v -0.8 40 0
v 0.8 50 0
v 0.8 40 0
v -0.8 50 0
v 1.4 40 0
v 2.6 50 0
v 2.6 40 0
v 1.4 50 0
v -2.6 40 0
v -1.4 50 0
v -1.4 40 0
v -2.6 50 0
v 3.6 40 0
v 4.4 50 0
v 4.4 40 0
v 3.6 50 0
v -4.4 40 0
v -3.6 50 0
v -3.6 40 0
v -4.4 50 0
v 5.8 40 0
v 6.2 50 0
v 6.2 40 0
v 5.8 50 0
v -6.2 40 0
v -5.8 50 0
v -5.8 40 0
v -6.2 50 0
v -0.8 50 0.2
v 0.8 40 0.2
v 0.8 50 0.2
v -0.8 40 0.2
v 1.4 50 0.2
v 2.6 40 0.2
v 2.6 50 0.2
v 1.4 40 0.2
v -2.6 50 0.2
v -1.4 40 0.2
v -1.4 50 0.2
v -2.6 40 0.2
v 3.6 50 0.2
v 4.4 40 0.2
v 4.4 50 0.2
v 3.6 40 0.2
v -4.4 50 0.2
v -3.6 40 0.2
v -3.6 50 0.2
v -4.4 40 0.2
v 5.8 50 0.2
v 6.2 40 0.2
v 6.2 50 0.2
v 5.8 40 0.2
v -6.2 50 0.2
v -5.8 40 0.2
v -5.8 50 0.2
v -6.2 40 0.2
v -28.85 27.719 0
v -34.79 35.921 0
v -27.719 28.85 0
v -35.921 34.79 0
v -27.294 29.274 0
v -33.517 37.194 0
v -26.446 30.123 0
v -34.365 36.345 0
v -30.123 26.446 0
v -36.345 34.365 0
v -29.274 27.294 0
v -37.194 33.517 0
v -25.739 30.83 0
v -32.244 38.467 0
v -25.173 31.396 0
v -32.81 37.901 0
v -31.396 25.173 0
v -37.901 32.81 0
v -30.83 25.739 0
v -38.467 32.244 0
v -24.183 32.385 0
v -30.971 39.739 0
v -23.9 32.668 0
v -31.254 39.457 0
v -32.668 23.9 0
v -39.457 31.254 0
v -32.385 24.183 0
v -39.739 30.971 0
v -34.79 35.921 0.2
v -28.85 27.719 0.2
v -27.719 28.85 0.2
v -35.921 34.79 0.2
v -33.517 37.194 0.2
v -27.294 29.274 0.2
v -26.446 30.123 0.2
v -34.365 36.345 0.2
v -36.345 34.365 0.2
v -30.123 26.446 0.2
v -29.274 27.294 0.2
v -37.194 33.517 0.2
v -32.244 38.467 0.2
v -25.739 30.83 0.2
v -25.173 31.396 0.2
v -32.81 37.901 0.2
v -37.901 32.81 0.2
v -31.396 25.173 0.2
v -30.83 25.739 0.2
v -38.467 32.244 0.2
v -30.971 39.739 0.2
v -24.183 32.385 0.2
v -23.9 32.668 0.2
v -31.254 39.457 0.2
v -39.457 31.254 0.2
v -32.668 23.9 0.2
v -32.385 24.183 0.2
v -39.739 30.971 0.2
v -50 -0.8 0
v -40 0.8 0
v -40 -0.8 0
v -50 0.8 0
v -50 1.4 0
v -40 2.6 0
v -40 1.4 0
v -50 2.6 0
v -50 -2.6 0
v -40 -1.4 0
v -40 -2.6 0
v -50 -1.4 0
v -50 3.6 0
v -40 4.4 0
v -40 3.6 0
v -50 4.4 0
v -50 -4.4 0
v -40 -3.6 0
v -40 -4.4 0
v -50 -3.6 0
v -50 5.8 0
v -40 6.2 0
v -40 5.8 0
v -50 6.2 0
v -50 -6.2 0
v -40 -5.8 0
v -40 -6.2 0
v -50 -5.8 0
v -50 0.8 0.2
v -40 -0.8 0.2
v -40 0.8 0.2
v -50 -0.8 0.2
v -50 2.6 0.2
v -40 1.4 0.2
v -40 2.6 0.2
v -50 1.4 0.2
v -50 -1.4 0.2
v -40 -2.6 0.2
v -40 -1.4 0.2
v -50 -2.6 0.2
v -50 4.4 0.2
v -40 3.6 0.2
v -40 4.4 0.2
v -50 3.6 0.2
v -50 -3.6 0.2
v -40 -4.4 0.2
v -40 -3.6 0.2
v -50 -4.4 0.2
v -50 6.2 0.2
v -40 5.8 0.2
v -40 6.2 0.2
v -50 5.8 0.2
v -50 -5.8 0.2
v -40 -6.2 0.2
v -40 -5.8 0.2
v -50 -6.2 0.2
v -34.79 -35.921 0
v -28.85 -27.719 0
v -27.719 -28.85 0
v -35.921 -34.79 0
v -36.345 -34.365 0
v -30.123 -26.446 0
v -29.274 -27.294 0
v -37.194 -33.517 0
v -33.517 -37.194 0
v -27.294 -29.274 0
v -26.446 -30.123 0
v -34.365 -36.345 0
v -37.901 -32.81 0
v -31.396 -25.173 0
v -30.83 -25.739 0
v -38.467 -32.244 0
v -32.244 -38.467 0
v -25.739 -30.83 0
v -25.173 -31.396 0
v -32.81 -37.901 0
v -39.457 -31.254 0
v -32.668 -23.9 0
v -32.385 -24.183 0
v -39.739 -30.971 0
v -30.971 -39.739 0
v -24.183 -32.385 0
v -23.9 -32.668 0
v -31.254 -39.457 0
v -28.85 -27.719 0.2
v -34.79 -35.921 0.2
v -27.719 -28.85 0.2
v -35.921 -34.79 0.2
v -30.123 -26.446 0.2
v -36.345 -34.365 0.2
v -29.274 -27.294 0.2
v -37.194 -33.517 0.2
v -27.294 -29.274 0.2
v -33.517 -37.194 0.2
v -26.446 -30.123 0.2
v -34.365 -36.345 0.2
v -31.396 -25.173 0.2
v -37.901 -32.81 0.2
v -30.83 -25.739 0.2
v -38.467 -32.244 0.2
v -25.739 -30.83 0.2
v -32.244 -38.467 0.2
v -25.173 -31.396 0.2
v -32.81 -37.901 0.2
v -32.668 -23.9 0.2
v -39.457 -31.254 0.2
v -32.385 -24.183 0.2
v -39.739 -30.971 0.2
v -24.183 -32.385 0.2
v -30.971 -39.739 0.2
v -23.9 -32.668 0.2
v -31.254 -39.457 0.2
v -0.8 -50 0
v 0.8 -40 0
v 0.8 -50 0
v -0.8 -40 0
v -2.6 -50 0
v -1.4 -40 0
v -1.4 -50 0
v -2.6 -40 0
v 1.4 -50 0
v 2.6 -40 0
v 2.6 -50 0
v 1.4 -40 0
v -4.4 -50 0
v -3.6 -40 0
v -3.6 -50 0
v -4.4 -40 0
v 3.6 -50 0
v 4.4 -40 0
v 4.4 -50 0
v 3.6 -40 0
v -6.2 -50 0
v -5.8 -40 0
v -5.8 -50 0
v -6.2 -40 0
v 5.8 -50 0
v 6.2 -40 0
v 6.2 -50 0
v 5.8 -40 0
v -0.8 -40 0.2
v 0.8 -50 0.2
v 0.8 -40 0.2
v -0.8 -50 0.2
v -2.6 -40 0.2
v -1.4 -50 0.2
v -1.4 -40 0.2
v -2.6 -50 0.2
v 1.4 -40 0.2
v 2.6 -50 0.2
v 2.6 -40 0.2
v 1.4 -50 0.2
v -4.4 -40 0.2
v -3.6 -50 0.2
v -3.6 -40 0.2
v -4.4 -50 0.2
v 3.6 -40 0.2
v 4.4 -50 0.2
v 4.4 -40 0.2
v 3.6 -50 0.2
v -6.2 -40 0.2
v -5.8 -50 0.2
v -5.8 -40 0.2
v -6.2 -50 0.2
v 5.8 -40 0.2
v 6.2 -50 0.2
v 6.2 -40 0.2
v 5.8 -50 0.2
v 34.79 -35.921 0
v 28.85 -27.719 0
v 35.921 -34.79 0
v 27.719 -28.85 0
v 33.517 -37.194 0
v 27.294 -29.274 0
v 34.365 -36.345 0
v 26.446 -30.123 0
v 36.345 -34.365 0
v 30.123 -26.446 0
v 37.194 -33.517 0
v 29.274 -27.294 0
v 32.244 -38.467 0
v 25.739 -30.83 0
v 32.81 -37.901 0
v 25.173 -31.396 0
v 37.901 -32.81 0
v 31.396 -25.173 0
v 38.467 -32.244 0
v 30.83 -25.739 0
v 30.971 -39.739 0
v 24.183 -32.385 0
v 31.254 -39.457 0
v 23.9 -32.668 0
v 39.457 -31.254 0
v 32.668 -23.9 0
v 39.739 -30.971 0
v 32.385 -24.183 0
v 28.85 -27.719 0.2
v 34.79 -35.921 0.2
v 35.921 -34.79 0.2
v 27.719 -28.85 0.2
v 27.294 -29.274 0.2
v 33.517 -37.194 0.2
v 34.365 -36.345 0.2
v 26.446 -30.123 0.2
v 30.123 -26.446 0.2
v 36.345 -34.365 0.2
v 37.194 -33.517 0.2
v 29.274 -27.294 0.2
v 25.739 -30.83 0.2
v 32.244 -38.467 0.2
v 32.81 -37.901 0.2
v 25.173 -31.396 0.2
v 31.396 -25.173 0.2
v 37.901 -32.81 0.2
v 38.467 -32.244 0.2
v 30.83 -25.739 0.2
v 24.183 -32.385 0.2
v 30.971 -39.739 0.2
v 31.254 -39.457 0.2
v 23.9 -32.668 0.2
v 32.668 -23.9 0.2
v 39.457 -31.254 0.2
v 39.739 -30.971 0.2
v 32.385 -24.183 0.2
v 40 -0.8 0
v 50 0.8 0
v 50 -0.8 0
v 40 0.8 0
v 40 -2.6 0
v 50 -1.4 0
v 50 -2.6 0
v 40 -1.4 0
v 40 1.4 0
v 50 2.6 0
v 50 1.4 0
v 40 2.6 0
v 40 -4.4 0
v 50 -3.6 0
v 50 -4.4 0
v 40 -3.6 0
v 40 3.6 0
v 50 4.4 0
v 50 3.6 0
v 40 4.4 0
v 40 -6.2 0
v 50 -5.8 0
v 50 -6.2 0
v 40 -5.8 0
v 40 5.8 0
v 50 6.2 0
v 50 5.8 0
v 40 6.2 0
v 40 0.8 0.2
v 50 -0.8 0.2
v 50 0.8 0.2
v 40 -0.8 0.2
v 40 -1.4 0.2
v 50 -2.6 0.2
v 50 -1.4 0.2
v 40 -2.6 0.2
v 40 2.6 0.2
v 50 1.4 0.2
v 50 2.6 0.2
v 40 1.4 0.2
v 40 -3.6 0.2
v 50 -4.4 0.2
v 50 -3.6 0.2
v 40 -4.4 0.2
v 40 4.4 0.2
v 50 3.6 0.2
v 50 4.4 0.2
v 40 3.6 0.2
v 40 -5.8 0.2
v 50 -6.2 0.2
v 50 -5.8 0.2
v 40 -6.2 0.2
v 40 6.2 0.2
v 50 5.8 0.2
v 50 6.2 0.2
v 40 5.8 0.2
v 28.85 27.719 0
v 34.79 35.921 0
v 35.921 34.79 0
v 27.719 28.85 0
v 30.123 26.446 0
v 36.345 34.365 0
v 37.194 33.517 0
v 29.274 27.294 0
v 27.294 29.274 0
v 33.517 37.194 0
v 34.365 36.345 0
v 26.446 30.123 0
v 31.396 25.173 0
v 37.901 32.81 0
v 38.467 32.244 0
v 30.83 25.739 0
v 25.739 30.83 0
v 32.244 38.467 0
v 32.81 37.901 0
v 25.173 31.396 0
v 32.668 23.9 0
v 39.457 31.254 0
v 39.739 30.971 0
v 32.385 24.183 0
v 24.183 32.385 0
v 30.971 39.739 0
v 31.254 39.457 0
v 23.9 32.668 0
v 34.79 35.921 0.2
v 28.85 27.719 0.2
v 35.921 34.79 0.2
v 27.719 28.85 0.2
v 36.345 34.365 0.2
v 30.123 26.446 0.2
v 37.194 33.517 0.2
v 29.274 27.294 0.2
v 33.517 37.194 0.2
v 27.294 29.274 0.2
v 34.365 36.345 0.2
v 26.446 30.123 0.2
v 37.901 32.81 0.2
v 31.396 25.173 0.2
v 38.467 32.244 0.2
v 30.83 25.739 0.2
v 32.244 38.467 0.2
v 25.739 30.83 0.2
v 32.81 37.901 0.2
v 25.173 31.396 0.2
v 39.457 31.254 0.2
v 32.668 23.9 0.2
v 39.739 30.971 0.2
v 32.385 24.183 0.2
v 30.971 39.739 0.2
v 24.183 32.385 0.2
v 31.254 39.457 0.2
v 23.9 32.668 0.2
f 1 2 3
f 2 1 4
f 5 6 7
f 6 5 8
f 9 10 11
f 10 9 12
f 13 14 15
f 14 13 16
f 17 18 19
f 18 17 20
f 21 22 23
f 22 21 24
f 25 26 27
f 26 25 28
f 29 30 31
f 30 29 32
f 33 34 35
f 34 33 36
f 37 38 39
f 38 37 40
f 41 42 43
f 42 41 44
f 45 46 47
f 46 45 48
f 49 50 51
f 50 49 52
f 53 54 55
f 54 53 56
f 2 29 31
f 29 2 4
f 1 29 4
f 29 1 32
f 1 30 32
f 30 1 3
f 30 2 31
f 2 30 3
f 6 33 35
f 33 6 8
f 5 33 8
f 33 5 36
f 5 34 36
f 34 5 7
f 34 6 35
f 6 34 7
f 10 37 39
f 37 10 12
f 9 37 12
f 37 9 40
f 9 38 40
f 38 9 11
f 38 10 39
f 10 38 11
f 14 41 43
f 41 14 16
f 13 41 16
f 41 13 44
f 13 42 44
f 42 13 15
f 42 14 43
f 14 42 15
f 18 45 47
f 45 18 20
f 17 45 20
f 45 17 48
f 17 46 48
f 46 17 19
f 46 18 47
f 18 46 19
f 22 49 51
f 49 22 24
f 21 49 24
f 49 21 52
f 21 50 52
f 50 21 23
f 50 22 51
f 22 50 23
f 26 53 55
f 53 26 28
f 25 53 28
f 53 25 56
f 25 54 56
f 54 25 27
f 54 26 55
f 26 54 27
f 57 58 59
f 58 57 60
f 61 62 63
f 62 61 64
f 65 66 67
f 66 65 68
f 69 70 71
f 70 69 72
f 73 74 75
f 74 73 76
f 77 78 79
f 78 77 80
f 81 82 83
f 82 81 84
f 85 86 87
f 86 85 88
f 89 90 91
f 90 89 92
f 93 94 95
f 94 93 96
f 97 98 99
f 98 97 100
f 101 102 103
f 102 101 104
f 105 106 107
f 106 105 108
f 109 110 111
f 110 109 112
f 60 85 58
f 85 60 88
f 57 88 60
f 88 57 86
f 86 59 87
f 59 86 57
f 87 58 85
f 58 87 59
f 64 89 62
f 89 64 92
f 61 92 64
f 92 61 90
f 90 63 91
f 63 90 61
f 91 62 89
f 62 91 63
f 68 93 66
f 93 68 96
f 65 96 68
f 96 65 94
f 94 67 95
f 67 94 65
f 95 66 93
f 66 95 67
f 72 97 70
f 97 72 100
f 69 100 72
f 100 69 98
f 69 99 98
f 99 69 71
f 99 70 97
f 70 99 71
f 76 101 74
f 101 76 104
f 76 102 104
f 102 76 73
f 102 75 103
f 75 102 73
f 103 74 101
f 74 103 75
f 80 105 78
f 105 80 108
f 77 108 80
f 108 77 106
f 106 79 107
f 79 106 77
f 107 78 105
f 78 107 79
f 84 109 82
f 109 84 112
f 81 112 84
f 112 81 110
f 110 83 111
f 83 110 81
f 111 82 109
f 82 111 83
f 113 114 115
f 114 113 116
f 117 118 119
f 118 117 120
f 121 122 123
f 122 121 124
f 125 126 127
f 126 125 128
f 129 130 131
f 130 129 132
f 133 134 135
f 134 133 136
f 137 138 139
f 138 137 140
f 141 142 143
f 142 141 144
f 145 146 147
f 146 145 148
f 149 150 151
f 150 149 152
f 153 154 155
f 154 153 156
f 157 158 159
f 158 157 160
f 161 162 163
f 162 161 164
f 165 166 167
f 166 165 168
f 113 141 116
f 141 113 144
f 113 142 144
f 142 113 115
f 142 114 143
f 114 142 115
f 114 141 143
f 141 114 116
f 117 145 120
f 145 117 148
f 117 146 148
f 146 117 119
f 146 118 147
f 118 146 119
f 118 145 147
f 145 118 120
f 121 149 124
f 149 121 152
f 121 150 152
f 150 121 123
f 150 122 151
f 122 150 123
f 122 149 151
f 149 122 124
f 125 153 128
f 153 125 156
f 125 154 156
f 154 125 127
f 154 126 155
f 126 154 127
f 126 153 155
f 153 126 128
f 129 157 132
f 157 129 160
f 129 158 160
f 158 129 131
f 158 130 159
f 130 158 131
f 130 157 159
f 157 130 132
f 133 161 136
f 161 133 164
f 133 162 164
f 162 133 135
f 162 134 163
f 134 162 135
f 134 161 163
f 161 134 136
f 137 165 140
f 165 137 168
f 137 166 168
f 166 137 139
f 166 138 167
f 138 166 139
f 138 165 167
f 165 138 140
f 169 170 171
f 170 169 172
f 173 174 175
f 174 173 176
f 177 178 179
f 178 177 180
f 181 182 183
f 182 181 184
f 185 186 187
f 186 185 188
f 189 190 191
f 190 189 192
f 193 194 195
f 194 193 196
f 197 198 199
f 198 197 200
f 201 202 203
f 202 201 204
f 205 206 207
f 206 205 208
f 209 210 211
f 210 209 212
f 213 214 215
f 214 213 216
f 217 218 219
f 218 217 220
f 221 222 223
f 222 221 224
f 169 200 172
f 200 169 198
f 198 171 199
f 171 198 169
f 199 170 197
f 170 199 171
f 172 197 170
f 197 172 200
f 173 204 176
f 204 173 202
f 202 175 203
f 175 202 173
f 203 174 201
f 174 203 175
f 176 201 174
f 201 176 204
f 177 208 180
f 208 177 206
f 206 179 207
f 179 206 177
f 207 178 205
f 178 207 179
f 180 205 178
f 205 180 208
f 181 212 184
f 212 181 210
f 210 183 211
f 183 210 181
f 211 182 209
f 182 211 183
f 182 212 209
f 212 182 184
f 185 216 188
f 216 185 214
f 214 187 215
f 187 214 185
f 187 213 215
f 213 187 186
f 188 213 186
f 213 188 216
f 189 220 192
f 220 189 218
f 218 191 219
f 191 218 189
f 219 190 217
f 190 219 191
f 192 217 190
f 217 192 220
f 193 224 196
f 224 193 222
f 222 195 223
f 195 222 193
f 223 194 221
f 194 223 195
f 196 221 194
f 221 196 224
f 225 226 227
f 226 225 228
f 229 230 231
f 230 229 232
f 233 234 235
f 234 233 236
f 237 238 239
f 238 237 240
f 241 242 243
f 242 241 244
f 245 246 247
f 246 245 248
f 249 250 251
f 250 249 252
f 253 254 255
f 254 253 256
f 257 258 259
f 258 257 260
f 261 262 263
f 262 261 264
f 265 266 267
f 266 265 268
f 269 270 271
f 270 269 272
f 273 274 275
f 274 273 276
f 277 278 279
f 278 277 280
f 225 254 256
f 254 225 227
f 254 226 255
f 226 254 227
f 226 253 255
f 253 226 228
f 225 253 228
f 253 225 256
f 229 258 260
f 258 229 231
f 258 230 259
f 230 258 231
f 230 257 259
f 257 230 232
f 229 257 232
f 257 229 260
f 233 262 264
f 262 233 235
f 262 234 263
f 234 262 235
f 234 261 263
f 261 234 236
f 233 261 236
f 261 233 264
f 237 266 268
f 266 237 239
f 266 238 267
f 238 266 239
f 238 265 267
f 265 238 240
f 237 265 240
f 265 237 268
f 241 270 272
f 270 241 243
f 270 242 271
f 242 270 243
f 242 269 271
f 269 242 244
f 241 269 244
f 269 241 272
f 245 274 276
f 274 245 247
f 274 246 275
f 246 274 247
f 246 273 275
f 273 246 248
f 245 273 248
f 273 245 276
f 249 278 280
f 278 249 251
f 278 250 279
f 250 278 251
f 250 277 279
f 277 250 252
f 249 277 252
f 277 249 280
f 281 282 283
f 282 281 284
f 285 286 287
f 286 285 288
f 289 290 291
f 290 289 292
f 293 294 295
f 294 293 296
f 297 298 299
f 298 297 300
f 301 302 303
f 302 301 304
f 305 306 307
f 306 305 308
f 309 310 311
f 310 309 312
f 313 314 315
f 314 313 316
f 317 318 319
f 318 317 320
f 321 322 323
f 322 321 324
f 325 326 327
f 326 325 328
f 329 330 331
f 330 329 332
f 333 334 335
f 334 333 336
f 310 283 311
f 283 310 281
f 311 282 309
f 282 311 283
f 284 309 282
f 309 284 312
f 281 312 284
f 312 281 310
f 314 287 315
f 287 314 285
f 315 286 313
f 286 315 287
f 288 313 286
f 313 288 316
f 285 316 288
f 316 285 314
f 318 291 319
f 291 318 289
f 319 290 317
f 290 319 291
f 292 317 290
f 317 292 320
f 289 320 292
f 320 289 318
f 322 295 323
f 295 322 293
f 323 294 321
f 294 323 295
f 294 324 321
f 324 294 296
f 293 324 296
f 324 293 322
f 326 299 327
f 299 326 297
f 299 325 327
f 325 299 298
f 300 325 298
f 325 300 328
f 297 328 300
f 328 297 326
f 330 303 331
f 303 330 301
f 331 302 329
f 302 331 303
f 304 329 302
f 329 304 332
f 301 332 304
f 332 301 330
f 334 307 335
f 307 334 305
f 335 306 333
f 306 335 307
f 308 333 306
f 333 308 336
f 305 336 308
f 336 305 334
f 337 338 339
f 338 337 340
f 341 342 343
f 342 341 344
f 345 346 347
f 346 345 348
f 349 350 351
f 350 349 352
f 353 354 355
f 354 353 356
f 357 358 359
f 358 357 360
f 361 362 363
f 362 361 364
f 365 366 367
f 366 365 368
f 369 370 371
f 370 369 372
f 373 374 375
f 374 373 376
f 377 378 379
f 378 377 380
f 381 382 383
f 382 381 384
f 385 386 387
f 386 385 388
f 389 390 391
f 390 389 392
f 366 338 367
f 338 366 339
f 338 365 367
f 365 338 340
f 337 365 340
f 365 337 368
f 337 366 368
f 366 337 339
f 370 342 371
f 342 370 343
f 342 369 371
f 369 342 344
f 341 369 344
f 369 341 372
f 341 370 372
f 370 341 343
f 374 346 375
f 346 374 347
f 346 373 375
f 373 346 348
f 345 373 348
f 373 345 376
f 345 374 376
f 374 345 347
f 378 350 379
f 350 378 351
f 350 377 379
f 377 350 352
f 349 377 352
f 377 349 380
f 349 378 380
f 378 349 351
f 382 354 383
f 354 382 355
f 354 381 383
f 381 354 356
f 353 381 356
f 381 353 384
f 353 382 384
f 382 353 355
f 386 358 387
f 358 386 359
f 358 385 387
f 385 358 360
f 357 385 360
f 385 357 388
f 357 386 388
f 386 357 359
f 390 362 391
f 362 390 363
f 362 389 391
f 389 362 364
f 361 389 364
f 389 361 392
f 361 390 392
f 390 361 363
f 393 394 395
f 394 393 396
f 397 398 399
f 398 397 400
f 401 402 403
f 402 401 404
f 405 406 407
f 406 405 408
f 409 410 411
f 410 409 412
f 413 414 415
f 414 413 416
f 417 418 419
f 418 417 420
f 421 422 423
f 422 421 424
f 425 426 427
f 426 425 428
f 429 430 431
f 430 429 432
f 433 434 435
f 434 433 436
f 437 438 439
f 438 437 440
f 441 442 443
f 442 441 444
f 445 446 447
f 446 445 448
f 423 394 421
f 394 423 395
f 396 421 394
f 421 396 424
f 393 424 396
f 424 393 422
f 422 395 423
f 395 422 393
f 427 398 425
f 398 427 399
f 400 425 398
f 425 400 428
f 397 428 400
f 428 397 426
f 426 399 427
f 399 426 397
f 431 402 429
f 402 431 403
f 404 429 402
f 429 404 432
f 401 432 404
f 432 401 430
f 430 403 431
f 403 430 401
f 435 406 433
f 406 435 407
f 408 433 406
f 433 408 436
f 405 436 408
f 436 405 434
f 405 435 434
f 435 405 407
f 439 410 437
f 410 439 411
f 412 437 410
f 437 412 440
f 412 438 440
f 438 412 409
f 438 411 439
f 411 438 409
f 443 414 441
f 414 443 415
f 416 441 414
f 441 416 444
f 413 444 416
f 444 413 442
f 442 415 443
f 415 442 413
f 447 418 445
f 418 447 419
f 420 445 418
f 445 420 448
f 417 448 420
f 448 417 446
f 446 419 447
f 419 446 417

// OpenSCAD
// Layer Height
layerHeight = 0.2; // [0.01:0.01:2]

// Width of your nozzle
layerWidth = 0.4; // [0.01:0.01:2]

// Length of test lines
testLength = 10; // [2:100]

// Mid-point Radius of test lines
distanceFromCenter = 40; //

// Number of test sizes per angle
numberOfSizes = 4;

// Outer Lines
for(i = [0:45:315]) {
    linear_extrude(layerHeight)
    rotate([0, 0, i])
    translate([0, distanceFromCenter])
    outerLine();
}


module outerLine() {
    
    lineSeg(layerWidth * numberOfSizes, testLength); 
    
    c = numberOfSizes + 1;
    for (j = [2:c]) {
        ij = c - j;
        
        translate([layerWidth * (j - 1) * c, 0])
        lineSeg(layerWidth * ij, testLength); 
        translate([-layerWidth * (j - 1) * c, 0])
        lineSeg(layerWidth * ij, testLength); 
    }
}

module lineSeg(w, l) {
    translate([-(w/2), 0])
    square([w, l]);
}
